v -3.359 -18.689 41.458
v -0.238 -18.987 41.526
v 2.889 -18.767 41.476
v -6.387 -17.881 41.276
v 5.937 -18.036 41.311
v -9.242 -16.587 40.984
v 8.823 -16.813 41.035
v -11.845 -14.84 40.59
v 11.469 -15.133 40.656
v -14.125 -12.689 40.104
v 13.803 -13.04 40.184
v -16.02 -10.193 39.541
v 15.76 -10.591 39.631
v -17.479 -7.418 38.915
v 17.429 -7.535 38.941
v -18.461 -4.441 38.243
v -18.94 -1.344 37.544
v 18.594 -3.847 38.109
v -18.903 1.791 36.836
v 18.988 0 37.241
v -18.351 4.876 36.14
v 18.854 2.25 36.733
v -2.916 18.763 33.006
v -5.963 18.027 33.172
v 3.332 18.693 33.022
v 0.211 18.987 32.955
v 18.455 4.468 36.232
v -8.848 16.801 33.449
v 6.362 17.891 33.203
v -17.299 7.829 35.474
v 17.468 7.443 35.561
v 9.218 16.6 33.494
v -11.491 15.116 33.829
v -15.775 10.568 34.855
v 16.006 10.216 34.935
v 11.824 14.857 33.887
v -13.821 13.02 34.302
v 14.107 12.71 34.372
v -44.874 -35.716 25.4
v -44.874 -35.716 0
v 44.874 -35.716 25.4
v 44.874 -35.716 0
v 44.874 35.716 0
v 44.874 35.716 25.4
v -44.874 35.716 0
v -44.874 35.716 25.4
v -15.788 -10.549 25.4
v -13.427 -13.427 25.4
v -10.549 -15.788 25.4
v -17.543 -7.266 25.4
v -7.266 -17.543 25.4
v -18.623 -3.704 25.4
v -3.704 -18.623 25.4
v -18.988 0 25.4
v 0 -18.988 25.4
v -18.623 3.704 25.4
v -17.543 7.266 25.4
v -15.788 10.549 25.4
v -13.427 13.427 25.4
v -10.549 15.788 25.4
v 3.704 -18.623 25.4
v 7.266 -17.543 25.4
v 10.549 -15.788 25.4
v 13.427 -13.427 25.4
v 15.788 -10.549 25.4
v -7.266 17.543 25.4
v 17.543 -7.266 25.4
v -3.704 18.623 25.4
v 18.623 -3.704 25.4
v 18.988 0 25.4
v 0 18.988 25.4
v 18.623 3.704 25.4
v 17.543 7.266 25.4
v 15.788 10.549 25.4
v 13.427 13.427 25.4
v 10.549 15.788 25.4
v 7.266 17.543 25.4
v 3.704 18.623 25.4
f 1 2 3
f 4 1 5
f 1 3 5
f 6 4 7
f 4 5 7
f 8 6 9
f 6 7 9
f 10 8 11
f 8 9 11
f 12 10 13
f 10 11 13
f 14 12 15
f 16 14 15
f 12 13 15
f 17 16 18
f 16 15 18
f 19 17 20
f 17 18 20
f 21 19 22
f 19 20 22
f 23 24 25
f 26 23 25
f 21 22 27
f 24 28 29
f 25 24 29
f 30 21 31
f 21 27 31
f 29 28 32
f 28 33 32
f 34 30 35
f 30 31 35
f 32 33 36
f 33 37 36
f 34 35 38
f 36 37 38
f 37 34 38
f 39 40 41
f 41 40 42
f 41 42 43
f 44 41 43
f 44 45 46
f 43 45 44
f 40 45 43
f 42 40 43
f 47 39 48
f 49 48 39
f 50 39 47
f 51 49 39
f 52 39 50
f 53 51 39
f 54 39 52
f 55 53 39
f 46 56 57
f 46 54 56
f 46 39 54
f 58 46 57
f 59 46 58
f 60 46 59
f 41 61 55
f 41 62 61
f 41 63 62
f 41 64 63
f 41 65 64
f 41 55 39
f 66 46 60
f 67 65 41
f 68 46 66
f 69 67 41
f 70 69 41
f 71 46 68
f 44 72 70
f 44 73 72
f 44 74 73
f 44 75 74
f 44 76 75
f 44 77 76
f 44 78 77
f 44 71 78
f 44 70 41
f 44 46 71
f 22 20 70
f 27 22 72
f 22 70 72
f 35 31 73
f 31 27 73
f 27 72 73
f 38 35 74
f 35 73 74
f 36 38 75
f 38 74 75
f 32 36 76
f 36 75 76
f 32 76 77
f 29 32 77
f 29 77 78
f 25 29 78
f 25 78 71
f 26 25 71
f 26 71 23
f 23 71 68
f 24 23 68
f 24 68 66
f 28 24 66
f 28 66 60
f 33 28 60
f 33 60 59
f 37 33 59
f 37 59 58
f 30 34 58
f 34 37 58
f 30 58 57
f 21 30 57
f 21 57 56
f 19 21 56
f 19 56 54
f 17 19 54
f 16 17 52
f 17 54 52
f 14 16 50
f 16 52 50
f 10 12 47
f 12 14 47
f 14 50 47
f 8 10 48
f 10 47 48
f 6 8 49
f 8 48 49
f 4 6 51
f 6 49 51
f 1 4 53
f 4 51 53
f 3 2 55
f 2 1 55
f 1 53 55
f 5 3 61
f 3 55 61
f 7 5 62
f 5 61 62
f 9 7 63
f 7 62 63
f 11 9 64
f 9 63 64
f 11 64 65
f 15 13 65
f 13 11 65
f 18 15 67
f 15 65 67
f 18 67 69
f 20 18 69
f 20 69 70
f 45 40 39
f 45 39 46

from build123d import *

# Parameters (mm, degrees)
F0_W     = 89.748614
F0_H     = 71.432554
F1_DEPTH = 25.4
F2_R     = 18.988019
F3_DEPTH = 25.4
F5_DEPTH = 635


with BuildPart() as f1:
    # F0 (on Top) → F1 (new body)
    with BuildSketch(Plane.XY):
        Rectangle(F0_W, F0_H)
    extrude(amount=F1_DEPTH)

    # F2 (on face) → F3 (join)
    with BuildSketch(Plane.XY.offset(25.4)):
        Circle(F2_R)
    extrude(amount=F3_DEPTH)

    # F4 (on Right) → F5 (cut, symmetric)
    with BuildSketch(Plane.YZ):
        Polygon((-20.643182, 53.957682), (-20.643182, 41.899621), (23.315316, 31.978432), (23.315316, 53.957682), align=None)
    extrude(amount=F5_DEPTH, both=True, mode=Mode.SUBTRACT)


solid = f1.part
